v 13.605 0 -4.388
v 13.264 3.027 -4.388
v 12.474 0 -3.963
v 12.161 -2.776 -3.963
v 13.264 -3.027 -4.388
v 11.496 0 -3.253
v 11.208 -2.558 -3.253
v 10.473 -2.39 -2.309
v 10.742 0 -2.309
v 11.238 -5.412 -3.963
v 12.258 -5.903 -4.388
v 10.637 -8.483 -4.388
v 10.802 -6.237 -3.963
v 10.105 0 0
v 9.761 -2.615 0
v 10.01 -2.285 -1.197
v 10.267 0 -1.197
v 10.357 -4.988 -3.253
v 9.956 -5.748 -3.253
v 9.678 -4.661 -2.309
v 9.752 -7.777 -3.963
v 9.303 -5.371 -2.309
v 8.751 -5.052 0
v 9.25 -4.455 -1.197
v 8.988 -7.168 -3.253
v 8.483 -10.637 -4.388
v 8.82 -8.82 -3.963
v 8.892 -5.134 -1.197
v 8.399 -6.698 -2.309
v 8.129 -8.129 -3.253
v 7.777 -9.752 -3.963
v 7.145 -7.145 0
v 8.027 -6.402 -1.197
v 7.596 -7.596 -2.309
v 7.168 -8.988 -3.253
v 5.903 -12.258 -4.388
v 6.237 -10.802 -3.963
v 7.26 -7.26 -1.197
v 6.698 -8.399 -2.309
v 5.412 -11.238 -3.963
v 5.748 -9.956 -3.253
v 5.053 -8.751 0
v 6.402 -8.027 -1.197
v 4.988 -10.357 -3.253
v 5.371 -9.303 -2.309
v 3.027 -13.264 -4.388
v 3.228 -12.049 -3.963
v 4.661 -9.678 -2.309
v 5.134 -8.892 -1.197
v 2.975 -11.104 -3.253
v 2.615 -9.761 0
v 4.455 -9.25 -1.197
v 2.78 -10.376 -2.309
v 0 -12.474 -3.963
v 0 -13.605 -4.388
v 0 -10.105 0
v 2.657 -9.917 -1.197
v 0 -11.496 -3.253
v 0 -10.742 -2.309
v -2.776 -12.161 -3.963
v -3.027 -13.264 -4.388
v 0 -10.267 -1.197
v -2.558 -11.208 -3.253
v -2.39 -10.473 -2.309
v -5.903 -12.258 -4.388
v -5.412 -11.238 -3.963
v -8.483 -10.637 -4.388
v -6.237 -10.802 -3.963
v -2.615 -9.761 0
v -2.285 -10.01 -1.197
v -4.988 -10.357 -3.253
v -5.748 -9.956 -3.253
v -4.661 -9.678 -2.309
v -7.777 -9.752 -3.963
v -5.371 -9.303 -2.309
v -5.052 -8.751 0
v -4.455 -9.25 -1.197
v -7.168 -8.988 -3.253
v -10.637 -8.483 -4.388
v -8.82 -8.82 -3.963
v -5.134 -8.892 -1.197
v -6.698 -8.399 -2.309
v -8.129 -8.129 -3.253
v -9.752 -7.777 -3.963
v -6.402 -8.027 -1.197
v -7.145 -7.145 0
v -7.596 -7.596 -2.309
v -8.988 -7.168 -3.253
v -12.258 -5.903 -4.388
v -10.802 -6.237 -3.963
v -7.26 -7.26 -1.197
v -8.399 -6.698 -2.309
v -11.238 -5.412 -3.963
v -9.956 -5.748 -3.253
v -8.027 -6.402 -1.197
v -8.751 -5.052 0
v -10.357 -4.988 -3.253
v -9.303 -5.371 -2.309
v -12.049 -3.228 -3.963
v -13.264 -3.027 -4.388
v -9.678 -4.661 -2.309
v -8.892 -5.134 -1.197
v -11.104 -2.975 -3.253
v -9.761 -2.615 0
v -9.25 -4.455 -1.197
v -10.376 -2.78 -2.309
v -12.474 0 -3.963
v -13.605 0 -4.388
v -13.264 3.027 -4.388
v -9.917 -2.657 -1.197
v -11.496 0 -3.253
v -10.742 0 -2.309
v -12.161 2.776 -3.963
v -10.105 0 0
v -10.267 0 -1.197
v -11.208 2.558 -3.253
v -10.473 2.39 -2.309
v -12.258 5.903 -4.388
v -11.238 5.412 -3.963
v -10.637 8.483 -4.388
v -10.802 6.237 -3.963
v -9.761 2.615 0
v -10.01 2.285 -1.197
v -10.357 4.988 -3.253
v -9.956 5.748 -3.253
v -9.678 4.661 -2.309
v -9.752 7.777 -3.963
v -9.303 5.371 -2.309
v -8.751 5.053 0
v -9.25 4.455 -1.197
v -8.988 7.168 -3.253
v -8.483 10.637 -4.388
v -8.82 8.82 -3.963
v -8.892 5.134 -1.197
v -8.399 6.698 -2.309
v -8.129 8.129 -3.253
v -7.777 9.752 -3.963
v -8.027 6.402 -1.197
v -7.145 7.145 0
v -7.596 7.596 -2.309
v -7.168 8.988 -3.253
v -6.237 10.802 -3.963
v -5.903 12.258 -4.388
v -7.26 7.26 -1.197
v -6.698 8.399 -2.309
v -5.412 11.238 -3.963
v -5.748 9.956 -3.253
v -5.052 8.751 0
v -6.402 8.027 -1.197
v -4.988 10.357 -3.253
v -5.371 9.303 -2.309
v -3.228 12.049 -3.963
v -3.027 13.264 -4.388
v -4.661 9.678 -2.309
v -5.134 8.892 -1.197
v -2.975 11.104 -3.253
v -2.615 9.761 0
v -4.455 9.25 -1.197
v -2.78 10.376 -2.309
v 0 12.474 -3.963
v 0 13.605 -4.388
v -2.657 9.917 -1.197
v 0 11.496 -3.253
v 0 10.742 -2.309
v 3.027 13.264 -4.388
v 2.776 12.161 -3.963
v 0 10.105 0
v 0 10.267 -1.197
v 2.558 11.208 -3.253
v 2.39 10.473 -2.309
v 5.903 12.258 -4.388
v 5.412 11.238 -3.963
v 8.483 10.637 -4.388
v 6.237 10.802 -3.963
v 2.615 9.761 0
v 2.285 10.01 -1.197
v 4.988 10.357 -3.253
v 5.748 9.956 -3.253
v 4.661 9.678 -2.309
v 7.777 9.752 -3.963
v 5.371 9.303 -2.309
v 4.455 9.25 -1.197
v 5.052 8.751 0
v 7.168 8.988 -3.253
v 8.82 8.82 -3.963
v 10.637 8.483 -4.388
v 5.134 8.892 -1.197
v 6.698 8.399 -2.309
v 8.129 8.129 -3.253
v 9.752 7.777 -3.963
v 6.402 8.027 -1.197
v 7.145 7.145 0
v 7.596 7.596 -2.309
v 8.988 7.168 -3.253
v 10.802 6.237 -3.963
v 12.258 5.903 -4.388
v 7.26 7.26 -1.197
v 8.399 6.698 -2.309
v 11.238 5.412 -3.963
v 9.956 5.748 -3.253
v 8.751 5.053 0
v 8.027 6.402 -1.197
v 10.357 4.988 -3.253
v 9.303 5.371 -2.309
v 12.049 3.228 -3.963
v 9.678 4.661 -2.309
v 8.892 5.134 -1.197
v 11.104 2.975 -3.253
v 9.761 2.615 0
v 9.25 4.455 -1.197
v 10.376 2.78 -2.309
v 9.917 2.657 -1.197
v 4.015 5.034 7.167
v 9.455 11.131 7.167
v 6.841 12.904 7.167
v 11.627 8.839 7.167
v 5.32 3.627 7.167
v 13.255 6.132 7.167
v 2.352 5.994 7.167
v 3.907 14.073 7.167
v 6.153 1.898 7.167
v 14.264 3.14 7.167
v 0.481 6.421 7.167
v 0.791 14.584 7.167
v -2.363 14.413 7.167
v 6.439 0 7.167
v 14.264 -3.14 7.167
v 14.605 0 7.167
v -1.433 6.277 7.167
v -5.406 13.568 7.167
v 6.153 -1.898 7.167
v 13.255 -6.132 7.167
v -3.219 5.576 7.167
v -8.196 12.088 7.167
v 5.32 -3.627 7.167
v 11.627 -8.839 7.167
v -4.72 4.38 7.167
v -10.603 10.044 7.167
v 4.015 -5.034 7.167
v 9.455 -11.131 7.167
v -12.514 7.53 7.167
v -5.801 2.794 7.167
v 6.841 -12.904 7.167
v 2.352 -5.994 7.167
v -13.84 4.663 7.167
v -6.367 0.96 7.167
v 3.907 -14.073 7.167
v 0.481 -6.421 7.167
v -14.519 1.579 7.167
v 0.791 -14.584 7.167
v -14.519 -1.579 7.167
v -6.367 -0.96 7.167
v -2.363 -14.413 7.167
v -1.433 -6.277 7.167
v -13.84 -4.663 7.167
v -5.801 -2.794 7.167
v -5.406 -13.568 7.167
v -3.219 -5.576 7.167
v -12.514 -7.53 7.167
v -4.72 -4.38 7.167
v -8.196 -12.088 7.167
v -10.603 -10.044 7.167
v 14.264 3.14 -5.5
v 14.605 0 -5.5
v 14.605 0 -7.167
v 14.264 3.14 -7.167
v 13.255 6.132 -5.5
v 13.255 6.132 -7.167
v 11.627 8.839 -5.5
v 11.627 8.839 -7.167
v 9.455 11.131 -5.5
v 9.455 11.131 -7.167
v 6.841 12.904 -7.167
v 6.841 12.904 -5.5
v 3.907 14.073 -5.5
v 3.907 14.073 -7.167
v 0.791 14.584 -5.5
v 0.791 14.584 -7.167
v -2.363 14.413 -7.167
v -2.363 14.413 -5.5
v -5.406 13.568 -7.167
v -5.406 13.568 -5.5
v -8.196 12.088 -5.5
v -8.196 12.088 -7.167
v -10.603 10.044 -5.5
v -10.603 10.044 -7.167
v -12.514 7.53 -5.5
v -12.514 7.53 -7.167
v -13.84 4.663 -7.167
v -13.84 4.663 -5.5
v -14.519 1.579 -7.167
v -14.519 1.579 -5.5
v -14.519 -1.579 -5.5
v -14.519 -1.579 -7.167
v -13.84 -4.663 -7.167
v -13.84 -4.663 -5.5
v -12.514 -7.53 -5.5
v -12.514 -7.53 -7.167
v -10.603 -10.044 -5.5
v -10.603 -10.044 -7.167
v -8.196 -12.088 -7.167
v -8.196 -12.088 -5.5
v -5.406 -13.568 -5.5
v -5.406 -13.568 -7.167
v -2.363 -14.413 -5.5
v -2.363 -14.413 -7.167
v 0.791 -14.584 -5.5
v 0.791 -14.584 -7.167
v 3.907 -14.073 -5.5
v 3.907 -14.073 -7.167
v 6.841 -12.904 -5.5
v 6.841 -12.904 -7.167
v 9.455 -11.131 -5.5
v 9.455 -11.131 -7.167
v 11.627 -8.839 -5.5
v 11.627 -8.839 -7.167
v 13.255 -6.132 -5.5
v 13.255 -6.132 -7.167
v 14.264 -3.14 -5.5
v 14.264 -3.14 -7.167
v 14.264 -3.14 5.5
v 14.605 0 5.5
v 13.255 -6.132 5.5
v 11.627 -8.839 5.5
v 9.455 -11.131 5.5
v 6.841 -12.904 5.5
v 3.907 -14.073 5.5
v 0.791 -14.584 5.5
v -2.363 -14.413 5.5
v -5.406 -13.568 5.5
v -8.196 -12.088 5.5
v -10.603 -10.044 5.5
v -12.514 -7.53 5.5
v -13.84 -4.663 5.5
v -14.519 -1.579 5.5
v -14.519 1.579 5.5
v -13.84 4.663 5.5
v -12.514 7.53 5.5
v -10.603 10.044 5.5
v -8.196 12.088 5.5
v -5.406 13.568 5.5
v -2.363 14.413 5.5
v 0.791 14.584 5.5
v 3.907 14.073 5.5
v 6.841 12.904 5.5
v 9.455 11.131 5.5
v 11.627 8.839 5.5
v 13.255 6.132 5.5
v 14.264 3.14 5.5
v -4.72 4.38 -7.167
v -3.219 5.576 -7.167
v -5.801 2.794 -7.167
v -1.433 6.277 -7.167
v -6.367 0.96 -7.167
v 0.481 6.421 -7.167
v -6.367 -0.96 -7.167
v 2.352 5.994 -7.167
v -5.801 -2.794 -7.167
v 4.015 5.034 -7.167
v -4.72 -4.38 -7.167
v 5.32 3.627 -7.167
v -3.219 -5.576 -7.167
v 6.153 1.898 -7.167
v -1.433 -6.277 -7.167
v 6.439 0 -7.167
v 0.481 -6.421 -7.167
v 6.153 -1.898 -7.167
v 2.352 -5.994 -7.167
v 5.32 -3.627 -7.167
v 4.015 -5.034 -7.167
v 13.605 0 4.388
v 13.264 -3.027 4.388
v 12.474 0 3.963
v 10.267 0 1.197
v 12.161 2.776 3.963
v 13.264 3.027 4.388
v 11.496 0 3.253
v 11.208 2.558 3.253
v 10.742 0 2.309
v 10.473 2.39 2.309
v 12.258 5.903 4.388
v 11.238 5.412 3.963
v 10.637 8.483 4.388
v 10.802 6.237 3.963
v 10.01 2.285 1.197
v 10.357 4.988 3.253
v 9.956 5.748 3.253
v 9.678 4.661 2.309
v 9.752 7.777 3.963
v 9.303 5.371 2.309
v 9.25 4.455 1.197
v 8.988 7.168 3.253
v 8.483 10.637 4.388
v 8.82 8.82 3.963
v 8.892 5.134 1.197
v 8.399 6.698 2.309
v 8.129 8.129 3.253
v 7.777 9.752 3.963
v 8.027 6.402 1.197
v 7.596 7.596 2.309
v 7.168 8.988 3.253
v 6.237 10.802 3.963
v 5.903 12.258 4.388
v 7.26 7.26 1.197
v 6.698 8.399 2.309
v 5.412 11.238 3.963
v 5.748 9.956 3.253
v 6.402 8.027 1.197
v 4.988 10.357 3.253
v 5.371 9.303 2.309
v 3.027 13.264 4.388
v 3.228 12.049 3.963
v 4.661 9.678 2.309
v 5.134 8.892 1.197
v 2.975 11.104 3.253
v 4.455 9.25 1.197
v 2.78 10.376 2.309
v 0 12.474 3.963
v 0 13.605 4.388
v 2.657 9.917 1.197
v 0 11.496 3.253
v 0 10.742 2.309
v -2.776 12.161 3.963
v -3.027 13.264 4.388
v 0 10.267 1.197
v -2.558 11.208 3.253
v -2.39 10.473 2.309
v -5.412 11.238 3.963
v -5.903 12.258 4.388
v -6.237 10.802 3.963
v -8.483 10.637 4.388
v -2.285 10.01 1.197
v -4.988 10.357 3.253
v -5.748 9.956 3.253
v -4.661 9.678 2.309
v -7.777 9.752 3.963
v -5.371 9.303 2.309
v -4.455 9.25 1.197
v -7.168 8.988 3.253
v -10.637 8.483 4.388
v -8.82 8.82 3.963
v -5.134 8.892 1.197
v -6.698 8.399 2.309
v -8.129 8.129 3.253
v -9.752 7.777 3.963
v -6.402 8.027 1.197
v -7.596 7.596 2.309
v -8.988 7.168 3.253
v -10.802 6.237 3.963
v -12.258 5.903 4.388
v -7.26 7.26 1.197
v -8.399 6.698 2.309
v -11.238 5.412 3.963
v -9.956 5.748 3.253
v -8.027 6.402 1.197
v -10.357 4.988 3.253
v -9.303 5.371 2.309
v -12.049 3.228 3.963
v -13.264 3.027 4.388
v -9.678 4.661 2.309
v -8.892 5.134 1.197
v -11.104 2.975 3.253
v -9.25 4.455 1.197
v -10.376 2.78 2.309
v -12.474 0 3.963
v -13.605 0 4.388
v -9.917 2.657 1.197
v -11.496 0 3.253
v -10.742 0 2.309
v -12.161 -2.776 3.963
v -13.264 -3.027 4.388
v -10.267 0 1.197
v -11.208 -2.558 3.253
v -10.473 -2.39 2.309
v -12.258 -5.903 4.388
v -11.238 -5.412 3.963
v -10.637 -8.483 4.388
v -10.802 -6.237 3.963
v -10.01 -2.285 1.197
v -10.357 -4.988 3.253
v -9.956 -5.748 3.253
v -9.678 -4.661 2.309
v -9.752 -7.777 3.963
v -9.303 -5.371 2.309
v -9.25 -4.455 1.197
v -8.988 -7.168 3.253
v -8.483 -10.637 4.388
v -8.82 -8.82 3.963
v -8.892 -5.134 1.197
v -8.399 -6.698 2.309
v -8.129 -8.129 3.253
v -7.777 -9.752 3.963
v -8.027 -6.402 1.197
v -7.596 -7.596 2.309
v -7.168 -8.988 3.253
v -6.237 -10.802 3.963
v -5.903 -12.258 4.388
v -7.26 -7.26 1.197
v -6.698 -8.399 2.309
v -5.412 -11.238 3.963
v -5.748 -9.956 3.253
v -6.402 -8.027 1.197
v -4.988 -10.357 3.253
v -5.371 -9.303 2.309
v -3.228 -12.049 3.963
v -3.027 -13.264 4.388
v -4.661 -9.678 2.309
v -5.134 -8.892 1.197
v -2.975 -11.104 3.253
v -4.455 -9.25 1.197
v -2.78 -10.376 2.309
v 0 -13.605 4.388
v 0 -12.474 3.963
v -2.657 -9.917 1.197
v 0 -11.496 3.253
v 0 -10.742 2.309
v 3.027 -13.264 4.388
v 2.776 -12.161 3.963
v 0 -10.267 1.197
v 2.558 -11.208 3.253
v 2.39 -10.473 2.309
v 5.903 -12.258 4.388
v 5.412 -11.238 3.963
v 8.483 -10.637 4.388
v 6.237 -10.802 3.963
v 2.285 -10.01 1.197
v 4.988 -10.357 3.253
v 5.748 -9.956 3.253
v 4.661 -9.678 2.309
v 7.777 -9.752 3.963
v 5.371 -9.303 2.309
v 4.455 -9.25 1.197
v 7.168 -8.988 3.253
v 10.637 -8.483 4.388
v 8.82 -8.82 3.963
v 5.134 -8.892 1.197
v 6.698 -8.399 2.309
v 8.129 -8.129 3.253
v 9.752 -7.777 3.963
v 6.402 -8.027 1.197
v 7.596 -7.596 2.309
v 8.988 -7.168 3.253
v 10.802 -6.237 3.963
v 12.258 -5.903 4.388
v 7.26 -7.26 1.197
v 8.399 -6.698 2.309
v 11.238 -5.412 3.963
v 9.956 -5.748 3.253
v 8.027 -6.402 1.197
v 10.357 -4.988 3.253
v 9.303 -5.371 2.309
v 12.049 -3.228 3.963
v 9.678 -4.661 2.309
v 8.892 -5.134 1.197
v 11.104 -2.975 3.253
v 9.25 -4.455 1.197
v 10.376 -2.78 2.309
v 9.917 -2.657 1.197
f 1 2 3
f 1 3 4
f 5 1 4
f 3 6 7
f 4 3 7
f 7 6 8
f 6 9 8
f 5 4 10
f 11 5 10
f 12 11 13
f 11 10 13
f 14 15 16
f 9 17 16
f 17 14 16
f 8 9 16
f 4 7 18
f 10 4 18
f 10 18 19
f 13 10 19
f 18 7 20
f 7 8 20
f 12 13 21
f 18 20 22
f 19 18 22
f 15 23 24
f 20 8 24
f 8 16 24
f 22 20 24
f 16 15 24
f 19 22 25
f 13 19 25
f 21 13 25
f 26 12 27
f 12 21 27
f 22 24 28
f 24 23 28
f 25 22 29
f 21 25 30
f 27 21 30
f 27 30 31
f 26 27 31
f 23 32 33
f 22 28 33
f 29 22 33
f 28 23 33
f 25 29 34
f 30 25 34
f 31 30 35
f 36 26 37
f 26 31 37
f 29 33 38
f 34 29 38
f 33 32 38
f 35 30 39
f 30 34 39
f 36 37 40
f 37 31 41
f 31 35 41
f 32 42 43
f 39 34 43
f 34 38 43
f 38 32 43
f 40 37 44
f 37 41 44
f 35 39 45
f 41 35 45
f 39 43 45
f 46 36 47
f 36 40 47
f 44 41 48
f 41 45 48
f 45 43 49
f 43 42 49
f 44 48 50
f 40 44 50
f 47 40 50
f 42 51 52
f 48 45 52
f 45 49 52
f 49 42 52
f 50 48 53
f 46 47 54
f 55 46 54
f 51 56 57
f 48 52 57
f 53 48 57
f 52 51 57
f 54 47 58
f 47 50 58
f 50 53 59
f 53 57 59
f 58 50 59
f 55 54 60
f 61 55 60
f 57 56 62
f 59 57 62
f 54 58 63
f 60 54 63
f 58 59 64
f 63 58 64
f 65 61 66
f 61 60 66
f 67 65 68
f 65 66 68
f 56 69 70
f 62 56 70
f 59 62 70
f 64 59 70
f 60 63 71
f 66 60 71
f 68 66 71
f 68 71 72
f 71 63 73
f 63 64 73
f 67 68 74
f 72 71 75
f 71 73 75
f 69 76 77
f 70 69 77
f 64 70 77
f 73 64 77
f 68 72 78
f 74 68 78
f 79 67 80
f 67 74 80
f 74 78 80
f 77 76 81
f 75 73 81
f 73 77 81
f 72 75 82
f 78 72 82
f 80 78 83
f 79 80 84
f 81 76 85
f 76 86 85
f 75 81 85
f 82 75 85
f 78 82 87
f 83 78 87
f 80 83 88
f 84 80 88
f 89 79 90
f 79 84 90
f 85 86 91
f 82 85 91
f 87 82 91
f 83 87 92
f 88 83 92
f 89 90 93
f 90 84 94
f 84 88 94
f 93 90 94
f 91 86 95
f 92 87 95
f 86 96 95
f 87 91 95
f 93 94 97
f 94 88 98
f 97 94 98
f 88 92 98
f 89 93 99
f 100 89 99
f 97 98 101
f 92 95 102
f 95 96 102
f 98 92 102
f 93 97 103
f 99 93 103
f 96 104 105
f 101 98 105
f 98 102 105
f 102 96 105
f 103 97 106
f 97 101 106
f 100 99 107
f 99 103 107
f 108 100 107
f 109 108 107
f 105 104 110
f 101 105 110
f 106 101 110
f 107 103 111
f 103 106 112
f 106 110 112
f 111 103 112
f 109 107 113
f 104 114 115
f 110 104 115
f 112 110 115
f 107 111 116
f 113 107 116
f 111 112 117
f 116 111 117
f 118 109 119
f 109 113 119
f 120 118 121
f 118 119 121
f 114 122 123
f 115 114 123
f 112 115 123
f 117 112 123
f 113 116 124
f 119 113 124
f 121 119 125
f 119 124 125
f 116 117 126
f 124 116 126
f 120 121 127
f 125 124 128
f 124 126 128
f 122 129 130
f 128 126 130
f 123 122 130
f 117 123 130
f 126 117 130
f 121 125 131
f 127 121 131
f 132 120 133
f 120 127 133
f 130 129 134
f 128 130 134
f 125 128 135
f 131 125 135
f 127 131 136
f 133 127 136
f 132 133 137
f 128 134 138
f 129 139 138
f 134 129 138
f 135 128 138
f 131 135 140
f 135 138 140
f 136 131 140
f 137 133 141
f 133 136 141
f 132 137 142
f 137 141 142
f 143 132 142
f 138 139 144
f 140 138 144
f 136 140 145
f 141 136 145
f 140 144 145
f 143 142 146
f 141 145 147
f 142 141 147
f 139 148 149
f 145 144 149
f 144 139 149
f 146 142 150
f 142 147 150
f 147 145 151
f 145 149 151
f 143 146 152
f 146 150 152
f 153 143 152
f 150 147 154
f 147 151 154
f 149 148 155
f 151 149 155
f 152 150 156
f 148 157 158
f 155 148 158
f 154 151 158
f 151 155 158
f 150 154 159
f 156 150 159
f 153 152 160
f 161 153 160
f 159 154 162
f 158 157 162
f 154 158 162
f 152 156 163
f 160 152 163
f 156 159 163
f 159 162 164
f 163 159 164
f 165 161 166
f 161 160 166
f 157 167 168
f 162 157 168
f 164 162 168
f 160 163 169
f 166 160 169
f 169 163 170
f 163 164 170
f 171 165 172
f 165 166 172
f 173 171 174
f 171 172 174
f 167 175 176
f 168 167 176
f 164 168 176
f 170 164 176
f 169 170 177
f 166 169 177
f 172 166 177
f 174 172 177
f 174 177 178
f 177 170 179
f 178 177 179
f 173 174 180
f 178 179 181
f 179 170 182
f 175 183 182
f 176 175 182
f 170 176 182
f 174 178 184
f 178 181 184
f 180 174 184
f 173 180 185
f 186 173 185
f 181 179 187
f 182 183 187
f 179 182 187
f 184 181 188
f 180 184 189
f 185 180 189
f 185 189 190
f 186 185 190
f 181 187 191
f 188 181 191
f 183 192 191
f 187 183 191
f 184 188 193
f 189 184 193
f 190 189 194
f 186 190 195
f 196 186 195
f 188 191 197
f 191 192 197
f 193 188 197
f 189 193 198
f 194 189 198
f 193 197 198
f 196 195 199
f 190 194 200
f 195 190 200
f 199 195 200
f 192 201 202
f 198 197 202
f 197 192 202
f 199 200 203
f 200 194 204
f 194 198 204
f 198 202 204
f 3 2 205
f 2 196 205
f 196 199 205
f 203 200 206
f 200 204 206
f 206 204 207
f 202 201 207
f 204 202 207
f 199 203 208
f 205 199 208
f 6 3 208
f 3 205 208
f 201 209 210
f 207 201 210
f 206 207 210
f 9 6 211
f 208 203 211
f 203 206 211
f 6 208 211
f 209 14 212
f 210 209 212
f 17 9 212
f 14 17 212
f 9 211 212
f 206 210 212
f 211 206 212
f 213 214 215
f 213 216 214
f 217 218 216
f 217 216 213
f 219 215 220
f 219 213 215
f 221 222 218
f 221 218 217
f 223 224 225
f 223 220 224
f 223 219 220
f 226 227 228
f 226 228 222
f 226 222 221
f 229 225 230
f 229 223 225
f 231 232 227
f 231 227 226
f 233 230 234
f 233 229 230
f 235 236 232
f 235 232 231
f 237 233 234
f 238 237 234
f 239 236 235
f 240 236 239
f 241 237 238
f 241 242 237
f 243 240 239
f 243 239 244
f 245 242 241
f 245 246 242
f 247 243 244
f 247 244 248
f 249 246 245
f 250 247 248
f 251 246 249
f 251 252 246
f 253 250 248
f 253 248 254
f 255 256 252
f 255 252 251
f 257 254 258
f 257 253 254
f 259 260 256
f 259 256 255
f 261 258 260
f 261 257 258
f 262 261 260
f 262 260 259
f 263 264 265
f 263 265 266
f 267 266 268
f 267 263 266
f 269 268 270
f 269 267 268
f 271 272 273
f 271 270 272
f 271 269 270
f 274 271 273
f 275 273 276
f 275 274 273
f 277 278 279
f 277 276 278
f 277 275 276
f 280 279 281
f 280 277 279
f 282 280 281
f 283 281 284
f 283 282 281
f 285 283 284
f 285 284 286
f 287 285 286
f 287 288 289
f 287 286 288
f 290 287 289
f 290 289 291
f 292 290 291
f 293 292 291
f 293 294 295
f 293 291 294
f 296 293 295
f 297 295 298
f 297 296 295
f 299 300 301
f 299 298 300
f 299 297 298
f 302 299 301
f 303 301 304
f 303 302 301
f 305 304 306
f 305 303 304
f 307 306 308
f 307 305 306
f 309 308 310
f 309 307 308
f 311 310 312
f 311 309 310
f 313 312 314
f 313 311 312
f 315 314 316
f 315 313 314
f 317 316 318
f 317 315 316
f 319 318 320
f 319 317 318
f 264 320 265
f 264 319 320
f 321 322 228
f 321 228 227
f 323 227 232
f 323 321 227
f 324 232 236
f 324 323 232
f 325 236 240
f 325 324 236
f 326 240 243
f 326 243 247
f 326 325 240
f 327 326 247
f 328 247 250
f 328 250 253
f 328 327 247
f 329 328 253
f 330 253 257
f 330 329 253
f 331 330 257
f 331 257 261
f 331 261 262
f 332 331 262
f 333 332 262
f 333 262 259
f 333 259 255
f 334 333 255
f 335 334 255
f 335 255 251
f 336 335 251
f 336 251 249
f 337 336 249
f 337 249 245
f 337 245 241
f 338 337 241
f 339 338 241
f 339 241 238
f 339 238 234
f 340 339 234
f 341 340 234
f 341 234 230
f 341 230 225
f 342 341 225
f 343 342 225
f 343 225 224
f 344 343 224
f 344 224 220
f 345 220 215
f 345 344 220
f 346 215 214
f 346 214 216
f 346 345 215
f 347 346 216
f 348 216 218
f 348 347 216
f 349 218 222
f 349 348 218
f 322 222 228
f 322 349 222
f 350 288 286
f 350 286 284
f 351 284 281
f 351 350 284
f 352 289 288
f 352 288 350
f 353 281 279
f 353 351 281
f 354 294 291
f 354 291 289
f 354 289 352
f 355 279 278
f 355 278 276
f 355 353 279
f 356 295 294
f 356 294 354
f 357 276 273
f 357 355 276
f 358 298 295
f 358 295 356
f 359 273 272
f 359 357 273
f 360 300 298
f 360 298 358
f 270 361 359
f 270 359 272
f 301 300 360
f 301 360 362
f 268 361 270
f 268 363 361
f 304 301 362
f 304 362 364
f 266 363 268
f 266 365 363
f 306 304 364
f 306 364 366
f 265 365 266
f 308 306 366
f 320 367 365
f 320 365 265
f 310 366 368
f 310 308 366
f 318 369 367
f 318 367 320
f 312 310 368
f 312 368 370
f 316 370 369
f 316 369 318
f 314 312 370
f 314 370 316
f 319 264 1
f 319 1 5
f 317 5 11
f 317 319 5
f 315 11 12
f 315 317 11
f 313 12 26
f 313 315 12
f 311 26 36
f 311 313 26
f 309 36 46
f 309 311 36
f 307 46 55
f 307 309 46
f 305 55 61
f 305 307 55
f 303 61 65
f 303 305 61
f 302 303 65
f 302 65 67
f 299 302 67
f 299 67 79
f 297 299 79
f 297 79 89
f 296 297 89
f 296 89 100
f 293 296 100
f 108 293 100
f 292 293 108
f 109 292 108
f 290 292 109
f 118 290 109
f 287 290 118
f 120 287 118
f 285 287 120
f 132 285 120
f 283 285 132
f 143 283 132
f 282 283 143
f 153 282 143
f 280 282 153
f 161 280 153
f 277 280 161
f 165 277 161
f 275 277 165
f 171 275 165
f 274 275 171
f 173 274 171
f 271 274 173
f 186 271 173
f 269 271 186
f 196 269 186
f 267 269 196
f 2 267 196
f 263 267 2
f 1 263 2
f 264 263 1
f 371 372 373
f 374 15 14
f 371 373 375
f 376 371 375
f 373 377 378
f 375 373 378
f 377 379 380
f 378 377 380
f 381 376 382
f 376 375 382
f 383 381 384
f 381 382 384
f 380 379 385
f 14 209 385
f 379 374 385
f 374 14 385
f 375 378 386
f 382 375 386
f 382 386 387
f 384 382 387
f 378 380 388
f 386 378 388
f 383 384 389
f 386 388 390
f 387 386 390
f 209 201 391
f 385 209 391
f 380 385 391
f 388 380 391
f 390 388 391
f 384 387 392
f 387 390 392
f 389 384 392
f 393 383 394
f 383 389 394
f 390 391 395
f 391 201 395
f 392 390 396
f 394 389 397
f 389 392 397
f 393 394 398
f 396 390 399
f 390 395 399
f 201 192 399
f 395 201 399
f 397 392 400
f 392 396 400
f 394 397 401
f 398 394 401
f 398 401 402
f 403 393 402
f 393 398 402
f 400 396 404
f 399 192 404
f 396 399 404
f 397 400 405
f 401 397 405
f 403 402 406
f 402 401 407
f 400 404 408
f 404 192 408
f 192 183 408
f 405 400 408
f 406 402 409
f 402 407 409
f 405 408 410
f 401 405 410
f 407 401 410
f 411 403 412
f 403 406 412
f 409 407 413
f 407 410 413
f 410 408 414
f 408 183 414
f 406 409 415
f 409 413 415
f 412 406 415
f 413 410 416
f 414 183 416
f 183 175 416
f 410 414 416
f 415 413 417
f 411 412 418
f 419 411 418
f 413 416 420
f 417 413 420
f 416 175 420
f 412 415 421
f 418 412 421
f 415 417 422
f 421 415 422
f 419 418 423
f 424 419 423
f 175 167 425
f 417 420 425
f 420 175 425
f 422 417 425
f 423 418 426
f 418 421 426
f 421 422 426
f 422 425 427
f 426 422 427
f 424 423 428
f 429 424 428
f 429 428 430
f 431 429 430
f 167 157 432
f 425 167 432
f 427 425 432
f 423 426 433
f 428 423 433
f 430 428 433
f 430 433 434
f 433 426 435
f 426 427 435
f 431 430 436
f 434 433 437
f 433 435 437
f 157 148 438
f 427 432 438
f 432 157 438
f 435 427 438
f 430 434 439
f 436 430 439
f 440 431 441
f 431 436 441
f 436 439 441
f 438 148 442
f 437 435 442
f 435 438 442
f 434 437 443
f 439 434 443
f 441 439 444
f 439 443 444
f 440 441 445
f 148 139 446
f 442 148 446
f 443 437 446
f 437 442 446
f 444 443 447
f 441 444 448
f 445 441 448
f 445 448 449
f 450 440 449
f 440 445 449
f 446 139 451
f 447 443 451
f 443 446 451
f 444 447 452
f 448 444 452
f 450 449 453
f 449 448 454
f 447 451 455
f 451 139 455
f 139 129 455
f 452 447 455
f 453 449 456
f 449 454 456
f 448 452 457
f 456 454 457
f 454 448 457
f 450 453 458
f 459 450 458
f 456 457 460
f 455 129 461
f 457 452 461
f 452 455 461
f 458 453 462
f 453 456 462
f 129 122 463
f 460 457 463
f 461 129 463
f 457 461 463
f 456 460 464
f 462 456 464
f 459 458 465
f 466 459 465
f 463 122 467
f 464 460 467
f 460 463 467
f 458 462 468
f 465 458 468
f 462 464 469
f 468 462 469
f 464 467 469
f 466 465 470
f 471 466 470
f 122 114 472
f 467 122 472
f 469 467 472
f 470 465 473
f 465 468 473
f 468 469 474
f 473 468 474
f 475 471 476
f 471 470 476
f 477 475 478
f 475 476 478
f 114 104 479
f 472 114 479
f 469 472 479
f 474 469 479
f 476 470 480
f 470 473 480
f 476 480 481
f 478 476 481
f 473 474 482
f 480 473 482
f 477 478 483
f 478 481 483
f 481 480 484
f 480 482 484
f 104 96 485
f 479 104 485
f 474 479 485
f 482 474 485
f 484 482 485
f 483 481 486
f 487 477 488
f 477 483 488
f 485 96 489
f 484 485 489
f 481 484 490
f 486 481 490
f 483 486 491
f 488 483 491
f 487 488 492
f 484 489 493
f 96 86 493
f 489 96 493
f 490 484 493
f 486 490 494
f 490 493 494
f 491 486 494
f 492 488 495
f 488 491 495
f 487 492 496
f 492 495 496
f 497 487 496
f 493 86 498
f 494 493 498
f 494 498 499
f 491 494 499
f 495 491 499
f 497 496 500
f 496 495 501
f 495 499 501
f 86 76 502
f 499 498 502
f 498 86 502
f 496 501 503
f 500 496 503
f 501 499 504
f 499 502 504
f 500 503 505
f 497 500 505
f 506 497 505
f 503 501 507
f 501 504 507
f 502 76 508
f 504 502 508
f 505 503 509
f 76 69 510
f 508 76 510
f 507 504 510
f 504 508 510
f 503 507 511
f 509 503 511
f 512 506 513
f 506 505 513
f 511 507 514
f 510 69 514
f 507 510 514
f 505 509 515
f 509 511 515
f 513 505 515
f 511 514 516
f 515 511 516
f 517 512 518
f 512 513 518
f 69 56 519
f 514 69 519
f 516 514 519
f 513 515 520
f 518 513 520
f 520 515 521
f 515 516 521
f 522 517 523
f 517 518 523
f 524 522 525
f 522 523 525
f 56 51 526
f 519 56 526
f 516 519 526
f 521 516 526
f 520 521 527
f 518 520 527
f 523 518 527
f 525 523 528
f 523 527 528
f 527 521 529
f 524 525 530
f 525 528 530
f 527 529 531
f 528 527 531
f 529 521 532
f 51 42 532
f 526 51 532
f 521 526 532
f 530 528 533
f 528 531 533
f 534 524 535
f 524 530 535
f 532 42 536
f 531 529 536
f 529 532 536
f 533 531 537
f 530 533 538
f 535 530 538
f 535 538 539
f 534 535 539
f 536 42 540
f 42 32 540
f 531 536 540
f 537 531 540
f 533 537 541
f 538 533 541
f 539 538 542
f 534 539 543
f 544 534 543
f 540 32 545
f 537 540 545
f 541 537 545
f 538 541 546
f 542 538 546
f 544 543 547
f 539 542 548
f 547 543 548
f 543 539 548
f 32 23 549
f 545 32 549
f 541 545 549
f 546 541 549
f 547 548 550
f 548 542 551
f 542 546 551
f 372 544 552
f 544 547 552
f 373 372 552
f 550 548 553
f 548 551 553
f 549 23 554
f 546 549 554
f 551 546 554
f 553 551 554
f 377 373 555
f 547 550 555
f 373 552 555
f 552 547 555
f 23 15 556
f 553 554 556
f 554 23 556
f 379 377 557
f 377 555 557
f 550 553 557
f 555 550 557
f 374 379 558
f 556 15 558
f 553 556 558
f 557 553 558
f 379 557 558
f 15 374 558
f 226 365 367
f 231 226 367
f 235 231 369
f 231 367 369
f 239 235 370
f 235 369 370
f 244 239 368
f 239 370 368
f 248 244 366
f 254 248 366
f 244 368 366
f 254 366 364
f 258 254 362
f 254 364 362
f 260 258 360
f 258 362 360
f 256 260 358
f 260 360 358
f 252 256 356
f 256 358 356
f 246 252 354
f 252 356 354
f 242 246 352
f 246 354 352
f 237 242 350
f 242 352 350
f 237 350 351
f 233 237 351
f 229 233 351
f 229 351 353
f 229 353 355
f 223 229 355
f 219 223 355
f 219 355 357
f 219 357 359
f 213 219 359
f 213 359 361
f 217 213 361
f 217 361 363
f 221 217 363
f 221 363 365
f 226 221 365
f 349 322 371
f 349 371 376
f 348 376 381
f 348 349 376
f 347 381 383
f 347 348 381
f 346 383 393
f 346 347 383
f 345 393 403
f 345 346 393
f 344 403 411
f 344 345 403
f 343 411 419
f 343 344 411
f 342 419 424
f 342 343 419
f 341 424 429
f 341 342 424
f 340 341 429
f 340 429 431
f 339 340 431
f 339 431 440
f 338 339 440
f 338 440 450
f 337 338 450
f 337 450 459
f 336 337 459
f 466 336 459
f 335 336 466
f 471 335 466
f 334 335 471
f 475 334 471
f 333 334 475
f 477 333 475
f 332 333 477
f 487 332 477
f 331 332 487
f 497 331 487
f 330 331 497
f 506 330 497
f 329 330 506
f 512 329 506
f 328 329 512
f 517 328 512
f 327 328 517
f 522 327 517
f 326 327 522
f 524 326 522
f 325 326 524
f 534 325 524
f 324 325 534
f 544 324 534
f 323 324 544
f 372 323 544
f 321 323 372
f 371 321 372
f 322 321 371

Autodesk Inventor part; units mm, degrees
ref_plane "YZ Plane" through (0, 0, 0) normal (1, 0, 0) x (0, 1, 0)
ref_plane "XZ Plane" through (0, 0, 0) normal (0, 1, 0) x (-1, 0, 0)
ref_plane "XY Plane" through (0, 0, 0) normal (0, 0, 1) x (1, 0, 0)
sketch "Sketch1" plane through (0, 0, 0) normal (0, 1, 0) x (-1, 0, 0)
  line L0 (-6.4389, 0) -> (-6.4389, -7.167)
  line L1 (-14.605, -5.5) -> (-13.605, -4.3875)
  line L2 (-14.605, -7.167) -> (-14.605, -5.5)
  line L3 (-6.4389, -7.167) -> (-14.605, -7.167)
  line L4 (-6.4389, 0) -> (-6.4389, -7.167)
  arc A0 (-13.605, -4.3875) -> (-10.105, 0) centre (-14.605, 0) ccw
  line L5 (0, 7.167) -> (0, -7.167)
  line L6 (-10.105, 0) -> (-6.4389, 0)
  point P0 (0, 0)
  point P1 (0, 0)
  dimension "d0" = 12.8778
  dimension "d1" = 29.21
  dimension "d2" = 1.667
  dimension "d3" = 4.5
  dimension "d6" = 8.1661
  dimension "d7" = 1
  dimension "d8" = 11
revolve "Revolution1" add sketch "Sketch1" angle 360 about axis through (0, 0, 7.167) along (0, 0, -1)
mirror "Mirror1" about plane through (10.105, 0, 0) normal (0, 0, 1)
properties part number "TTB 4mm Dyneema Cable Pulley" material "Acetal Resin, Black"
